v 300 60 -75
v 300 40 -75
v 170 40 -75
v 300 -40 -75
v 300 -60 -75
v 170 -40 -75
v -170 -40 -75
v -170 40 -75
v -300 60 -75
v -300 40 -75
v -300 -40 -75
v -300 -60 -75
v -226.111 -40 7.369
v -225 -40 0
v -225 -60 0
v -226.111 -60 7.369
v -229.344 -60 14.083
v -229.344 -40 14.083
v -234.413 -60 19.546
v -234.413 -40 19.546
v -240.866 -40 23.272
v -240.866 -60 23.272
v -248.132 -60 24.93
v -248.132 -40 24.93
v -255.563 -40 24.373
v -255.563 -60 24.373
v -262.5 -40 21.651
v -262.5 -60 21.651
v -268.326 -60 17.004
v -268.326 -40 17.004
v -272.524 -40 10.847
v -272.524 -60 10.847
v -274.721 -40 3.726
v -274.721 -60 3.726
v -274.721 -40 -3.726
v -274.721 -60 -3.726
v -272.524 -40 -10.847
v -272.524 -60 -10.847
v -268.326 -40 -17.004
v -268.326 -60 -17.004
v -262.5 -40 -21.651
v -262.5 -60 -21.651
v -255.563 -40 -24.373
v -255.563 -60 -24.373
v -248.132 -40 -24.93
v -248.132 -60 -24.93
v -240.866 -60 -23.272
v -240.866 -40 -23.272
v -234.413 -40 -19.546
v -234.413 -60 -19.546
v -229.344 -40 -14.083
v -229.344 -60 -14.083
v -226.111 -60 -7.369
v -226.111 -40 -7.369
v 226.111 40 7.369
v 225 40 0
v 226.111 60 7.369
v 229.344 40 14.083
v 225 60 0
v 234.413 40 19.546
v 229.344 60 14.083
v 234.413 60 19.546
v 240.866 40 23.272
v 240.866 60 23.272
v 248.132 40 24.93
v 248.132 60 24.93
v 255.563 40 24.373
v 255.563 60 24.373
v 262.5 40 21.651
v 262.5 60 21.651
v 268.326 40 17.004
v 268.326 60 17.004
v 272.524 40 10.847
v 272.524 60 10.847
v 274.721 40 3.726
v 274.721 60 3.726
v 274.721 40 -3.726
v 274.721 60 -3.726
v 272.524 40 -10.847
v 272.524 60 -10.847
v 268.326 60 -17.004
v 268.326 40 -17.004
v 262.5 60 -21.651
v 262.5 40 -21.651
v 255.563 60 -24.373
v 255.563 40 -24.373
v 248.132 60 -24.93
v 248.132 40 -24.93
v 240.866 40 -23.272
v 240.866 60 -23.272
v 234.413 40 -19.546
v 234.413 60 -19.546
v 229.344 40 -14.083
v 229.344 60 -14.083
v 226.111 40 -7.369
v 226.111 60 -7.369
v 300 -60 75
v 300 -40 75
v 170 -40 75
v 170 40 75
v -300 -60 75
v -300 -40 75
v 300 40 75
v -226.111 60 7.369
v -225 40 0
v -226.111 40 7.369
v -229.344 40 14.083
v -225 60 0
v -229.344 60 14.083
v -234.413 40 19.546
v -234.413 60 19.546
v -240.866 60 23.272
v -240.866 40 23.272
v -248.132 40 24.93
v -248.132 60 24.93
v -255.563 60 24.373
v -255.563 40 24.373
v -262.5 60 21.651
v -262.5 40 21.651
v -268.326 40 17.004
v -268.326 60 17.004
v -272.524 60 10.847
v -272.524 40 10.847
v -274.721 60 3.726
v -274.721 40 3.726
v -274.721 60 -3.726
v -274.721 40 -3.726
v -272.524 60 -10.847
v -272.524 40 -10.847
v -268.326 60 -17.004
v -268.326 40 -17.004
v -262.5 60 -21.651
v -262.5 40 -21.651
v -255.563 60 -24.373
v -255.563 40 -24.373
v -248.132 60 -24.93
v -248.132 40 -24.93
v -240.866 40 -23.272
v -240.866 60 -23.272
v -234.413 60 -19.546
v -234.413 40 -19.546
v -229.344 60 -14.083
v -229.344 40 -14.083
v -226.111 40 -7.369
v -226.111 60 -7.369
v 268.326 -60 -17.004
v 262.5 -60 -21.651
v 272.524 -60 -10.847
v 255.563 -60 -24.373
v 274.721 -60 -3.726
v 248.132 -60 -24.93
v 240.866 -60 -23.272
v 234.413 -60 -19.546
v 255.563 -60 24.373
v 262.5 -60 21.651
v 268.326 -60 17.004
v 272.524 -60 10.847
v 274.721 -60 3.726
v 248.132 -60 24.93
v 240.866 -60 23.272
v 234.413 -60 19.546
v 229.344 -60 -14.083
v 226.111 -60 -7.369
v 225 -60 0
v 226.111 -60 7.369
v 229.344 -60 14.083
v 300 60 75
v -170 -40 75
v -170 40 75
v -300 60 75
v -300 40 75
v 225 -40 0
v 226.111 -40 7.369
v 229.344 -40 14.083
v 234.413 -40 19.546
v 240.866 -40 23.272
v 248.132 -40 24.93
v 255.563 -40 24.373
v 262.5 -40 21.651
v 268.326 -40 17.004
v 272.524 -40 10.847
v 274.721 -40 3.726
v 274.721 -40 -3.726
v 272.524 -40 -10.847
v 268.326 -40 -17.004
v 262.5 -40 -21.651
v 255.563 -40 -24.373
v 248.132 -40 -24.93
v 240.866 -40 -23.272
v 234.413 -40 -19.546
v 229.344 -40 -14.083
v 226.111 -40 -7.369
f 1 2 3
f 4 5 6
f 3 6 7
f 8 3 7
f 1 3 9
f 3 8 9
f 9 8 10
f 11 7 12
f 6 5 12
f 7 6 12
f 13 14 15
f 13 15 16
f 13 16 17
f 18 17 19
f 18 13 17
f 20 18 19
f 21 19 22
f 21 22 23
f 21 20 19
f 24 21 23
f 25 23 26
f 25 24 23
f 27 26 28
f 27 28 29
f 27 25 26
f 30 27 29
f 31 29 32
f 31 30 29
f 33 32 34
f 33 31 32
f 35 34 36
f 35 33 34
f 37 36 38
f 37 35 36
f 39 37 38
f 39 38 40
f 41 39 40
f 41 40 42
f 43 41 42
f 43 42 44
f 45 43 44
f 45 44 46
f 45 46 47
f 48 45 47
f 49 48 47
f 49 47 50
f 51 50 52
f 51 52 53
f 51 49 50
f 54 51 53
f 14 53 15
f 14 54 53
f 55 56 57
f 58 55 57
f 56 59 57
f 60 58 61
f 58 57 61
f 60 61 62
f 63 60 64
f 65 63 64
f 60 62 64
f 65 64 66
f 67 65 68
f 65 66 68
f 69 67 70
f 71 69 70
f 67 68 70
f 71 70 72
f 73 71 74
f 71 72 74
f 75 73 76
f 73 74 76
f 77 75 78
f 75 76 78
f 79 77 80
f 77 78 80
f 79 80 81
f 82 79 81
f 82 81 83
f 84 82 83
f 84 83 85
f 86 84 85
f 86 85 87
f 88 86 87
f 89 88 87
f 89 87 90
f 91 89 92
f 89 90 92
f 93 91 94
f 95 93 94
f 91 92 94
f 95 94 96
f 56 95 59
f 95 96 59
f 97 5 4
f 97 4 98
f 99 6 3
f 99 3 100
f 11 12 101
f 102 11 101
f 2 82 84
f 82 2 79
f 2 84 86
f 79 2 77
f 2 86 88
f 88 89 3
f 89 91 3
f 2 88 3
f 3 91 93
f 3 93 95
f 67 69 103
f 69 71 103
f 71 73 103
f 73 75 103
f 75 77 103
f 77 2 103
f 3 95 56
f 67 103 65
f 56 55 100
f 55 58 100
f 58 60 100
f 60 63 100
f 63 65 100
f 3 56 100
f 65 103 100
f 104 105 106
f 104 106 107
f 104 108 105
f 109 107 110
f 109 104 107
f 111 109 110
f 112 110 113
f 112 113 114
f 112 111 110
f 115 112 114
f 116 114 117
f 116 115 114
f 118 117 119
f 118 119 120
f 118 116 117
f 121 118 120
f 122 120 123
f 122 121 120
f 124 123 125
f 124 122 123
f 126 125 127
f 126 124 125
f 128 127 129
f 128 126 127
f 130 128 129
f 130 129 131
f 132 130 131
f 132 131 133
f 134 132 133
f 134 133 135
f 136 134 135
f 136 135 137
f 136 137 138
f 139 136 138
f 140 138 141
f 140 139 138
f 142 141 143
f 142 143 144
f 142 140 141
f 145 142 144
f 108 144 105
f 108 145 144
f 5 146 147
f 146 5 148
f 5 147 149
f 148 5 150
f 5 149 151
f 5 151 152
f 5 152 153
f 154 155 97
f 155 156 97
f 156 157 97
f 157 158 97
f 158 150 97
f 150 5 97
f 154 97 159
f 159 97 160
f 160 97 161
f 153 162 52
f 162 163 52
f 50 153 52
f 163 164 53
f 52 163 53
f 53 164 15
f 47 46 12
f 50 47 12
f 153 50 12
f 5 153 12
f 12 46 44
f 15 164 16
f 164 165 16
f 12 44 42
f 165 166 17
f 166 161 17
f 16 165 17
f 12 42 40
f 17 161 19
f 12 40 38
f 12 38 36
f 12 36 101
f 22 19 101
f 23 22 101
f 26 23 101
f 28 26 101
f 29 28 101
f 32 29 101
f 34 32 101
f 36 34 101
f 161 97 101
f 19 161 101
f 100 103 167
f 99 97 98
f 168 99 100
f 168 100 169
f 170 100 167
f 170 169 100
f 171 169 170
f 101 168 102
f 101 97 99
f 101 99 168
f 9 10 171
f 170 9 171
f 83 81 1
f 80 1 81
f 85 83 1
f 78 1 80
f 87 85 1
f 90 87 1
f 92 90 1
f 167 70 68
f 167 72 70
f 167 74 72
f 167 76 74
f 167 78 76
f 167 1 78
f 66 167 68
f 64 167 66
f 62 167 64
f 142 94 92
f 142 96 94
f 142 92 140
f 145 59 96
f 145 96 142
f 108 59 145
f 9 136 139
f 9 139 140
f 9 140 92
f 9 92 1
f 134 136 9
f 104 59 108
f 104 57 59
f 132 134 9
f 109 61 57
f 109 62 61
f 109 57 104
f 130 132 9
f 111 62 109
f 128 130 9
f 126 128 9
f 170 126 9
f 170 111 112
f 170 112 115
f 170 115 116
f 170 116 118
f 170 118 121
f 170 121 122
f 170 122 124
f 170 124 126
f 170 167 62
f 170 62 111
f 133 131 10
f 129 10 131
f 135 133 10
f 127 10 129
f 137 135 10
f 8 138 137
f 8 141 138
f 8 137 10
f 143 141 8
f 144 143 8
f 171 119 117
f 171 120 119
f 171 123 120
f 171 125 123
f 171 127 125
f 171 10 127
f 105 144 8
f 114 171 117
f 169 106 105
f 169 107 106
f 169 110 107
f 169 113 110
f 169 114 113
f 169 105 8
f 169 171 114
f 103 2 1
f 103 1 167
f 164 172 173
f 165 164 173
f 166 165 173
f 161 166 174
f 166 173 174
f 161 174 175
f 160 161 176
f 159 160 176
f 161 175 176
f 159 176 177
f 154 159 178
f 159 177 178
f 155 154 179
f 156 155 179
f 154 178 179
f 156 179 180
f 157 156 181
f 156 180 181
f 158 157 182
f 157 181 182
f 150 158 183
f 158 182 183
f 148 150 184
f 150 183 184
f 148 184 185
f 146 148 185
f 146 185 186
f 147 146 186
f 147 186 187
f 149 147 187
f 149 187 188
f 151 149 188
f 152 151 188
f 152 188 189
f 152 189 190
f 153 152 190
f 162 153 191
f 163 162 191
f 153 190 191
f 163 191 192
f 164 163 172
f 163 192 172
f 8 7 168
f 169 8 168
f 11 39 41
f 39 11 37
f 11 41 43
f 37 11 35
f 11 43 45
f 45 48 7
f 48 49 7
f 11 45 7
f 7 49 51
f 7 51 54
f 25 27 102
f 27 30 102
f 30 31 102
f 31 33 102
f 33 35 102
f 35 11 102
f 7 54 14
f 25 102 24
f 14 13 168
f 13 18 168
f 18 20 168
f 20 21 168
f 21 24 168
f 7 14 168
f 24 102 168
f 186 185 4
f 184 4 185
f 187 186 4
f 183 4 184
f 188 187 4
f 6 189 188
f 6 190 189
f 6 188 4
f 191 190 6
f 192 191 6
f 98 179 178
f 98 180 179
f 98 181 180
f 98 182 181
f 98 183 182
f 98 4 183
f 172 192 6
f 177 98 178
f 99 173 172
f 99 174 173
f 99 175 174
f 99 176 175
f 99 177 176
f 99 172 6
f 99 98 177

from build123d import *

# Parameters (mm, degrees)
F0_W     = 300
F0_H     = 150
F0_R     = 25
F1_DEPTH = 60
F2_W     = 130
F2_H     = 150
F2_R     = 25
F3_DEPTH = 40


with BuildPart() as f1:
    # F0 (on Front) → F1 (new body, symmetric)
    with BuildSketch(Plane.XZ):
        with Locations((-150, 0)):
            Rectangle(F0_W, F0_H)
        with Locations((-250, 0)):
            Circle(F0_R, mode=Mode.SUBTRACT)
    extrude(amount=F1_DEPTH, both=True)

    # F2 (on Front) → F3 (cut, symmetric)
    with BuildSketch(Plane.XZ):
        with Locations((-235, 0)):
            Rectangle(F2_W, F2_H)
        with Locations((-250, 0)):
            Circle(F2_R, mode=Mode.SUBTRACT)
    extrude(amount=F3_DEPTH, both=True, mode=Mode.SUBTRACT)

    # F4: F1 across face


with BuildPart() as f1_1:
    add(f1.part)
    add(f1.part.mirror(Plane.YZ))


solid = f1_1.part
